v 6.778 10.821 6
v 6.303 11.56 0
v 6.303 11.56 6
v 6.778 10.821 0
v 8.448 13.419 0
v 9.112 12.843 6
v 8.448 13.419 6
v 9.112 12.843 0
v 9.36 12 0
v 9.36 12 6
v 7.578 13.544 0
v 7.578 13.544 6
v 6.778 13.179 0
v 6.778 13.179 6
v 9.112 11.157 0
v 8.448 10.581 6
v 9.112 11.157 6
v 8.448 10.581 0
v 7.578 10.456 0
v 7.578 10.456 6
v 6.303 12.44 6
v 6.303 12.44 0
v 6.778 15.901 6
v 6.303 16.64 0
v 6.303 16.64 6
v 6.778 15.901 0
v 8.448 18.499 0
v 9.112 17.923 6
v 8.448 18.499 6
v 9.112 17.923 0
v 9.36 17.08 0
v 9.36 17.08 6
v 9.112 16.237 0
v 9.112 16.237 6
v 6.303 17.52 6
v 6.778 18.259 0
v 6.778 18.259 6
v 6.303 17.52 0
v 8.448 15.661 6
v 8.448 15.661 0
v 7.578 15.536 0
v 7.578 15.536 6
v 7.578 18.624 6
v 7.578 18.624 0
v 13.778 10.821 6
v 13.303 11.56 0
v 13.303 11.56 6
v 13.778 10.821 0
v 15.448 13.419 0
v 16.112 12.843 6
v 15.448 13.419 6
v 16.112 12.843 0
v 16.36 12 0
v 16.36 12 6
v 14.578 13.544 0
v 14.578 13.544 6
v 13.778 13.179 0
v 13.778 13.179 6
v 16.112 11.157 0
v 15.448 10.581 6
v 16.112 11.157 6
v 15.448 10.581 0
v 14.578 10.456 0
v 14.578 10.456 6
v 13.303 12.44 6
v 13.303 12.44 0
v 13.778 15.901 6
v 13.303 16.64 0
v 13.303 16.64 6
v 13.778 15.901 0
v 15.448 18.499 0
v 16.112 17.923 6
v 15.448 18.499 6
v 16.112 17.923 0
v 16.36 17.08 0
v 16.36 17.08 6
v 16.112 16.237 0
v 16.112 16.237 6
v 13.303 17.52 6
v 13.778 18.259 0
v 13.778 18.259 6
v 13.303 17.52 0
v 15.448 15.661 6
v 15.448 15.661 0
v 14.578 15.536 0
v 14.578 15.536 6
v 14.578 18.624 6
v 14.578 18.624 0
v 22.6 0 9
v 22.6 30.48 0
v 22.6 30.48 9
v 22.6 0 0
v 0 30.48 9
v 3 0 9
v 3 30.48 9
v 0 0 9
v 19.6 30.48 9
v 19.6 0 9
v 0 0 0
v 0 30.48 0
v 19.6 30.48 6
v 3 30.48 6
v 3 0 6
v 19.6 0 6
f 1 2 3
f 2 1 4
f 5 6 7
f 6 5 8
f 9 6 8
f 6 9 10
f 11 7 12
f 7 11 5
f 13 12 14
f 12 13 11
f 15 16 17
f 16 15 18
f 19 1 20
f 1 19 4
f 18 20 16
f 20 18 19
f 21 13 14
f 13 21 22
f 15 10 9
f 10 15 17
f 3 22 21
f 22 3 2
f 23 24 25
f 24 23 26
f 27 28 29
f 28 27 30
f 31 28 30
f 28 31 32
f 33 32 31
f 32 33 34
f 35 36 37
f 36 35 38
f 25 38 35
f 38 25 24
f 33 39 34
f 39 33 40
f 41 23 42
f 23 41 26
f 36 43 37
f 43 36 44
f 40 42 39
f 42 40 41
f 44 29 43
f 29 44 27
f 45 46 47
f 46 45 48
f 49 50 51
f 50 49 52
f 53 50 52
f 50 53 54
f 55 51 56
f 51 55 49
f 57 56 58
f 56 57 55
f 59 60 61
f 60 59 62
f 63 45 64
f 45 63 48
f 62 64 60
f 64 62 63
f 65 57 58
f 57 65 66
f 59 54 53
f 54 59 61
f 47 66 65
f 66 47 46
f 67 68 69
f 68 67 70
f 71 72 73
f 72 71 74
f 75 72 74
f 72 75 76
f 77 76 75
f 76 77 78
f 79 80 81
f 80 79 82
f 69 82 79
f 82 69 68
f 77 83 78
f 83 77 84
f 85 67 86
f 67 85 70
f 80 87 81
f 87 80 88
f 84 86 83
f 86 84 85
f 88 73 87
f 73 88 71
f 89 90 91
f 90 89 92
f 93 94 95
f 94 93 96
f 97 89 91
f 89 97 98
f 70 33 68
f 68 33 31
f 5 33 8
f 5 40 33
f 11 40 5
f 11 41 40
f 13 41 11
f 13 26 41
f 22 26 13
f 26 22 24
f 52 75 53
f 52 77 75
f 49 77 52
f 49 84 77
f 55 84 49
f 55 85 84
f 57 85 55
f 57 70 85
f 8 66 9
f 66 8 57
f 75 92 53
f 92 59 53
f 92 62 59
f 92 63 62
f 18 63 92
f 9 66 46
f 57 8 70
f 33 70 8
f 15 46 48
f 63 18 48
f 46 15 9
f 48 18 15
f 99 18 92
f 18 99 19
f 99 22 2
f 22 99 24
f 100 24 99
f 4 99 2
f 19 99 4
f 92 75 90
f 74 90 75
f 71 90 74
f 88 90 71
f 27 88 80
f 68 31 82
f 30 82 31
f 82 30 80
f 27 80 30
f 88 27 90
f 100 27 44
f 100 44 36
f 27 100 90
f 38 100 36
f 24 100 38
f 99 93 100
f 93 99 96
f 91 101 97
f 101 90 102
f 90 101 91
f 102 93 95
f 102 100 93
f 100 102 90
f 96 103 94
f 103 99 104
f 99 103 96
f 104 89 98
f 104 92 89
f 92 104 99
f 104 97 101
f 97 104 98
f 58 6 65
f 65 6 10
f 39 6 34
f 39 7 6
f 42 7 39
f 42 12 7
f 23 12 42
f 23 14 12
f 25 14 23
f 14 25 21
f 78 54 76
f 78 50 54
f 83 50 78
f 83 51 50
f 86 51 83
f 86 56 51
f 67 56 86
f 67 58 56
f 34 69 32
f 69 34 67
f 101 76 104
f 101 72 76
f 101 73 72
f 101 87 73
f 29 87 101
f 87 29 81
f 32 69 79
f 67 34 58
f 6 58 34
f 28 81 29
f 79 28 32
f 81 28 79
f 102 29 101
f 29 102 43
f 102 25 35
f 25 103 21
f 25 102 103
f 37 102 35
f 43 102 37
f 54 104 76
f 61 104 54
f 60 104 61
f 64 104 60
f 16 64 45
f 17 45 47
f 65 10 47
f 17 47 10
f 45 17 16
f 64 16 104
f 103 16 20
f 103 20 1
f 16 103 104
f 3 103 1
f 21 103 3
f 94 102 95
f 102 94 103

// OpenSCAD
rail_width = 16.6;
hole_spacing_x = 7;
hole_spacing_y = 5.08;
guide_width = 3;
depth = 6;

width = guide_width * 2 + rail_width;

difference() {
    cube([width, hole_spacing_y * 6, depth + guide_width]);
    
    translate([guide_width, -1, depth])
    cube([rail_width, hole_spacing_y * 6 + 2, depth + guide_width]);
    
    
    translate([width / 2 - (hole_spacing_x / 2), 12, -1]) {
        cylinder(depth + guide_width, 1.56, 1.56, $fn = 11);
       
        translate([0, hole_spacing_y, 0])
            cylinder(depth + guide_width, 1.56, 1.56, $fn = 11);
    }
    
    
    translate([width / 2 + (hole_spacing_x / 2), 12, -1]) {
        cylinder(depth + guide_width, 1.56, 1.56, $fn = 11);
        
        translate([0, hole_spacing_y, 0])
            cylinder(depth + guide_width, 1.56, 1.56, $fn = 11);
    }
    
}
